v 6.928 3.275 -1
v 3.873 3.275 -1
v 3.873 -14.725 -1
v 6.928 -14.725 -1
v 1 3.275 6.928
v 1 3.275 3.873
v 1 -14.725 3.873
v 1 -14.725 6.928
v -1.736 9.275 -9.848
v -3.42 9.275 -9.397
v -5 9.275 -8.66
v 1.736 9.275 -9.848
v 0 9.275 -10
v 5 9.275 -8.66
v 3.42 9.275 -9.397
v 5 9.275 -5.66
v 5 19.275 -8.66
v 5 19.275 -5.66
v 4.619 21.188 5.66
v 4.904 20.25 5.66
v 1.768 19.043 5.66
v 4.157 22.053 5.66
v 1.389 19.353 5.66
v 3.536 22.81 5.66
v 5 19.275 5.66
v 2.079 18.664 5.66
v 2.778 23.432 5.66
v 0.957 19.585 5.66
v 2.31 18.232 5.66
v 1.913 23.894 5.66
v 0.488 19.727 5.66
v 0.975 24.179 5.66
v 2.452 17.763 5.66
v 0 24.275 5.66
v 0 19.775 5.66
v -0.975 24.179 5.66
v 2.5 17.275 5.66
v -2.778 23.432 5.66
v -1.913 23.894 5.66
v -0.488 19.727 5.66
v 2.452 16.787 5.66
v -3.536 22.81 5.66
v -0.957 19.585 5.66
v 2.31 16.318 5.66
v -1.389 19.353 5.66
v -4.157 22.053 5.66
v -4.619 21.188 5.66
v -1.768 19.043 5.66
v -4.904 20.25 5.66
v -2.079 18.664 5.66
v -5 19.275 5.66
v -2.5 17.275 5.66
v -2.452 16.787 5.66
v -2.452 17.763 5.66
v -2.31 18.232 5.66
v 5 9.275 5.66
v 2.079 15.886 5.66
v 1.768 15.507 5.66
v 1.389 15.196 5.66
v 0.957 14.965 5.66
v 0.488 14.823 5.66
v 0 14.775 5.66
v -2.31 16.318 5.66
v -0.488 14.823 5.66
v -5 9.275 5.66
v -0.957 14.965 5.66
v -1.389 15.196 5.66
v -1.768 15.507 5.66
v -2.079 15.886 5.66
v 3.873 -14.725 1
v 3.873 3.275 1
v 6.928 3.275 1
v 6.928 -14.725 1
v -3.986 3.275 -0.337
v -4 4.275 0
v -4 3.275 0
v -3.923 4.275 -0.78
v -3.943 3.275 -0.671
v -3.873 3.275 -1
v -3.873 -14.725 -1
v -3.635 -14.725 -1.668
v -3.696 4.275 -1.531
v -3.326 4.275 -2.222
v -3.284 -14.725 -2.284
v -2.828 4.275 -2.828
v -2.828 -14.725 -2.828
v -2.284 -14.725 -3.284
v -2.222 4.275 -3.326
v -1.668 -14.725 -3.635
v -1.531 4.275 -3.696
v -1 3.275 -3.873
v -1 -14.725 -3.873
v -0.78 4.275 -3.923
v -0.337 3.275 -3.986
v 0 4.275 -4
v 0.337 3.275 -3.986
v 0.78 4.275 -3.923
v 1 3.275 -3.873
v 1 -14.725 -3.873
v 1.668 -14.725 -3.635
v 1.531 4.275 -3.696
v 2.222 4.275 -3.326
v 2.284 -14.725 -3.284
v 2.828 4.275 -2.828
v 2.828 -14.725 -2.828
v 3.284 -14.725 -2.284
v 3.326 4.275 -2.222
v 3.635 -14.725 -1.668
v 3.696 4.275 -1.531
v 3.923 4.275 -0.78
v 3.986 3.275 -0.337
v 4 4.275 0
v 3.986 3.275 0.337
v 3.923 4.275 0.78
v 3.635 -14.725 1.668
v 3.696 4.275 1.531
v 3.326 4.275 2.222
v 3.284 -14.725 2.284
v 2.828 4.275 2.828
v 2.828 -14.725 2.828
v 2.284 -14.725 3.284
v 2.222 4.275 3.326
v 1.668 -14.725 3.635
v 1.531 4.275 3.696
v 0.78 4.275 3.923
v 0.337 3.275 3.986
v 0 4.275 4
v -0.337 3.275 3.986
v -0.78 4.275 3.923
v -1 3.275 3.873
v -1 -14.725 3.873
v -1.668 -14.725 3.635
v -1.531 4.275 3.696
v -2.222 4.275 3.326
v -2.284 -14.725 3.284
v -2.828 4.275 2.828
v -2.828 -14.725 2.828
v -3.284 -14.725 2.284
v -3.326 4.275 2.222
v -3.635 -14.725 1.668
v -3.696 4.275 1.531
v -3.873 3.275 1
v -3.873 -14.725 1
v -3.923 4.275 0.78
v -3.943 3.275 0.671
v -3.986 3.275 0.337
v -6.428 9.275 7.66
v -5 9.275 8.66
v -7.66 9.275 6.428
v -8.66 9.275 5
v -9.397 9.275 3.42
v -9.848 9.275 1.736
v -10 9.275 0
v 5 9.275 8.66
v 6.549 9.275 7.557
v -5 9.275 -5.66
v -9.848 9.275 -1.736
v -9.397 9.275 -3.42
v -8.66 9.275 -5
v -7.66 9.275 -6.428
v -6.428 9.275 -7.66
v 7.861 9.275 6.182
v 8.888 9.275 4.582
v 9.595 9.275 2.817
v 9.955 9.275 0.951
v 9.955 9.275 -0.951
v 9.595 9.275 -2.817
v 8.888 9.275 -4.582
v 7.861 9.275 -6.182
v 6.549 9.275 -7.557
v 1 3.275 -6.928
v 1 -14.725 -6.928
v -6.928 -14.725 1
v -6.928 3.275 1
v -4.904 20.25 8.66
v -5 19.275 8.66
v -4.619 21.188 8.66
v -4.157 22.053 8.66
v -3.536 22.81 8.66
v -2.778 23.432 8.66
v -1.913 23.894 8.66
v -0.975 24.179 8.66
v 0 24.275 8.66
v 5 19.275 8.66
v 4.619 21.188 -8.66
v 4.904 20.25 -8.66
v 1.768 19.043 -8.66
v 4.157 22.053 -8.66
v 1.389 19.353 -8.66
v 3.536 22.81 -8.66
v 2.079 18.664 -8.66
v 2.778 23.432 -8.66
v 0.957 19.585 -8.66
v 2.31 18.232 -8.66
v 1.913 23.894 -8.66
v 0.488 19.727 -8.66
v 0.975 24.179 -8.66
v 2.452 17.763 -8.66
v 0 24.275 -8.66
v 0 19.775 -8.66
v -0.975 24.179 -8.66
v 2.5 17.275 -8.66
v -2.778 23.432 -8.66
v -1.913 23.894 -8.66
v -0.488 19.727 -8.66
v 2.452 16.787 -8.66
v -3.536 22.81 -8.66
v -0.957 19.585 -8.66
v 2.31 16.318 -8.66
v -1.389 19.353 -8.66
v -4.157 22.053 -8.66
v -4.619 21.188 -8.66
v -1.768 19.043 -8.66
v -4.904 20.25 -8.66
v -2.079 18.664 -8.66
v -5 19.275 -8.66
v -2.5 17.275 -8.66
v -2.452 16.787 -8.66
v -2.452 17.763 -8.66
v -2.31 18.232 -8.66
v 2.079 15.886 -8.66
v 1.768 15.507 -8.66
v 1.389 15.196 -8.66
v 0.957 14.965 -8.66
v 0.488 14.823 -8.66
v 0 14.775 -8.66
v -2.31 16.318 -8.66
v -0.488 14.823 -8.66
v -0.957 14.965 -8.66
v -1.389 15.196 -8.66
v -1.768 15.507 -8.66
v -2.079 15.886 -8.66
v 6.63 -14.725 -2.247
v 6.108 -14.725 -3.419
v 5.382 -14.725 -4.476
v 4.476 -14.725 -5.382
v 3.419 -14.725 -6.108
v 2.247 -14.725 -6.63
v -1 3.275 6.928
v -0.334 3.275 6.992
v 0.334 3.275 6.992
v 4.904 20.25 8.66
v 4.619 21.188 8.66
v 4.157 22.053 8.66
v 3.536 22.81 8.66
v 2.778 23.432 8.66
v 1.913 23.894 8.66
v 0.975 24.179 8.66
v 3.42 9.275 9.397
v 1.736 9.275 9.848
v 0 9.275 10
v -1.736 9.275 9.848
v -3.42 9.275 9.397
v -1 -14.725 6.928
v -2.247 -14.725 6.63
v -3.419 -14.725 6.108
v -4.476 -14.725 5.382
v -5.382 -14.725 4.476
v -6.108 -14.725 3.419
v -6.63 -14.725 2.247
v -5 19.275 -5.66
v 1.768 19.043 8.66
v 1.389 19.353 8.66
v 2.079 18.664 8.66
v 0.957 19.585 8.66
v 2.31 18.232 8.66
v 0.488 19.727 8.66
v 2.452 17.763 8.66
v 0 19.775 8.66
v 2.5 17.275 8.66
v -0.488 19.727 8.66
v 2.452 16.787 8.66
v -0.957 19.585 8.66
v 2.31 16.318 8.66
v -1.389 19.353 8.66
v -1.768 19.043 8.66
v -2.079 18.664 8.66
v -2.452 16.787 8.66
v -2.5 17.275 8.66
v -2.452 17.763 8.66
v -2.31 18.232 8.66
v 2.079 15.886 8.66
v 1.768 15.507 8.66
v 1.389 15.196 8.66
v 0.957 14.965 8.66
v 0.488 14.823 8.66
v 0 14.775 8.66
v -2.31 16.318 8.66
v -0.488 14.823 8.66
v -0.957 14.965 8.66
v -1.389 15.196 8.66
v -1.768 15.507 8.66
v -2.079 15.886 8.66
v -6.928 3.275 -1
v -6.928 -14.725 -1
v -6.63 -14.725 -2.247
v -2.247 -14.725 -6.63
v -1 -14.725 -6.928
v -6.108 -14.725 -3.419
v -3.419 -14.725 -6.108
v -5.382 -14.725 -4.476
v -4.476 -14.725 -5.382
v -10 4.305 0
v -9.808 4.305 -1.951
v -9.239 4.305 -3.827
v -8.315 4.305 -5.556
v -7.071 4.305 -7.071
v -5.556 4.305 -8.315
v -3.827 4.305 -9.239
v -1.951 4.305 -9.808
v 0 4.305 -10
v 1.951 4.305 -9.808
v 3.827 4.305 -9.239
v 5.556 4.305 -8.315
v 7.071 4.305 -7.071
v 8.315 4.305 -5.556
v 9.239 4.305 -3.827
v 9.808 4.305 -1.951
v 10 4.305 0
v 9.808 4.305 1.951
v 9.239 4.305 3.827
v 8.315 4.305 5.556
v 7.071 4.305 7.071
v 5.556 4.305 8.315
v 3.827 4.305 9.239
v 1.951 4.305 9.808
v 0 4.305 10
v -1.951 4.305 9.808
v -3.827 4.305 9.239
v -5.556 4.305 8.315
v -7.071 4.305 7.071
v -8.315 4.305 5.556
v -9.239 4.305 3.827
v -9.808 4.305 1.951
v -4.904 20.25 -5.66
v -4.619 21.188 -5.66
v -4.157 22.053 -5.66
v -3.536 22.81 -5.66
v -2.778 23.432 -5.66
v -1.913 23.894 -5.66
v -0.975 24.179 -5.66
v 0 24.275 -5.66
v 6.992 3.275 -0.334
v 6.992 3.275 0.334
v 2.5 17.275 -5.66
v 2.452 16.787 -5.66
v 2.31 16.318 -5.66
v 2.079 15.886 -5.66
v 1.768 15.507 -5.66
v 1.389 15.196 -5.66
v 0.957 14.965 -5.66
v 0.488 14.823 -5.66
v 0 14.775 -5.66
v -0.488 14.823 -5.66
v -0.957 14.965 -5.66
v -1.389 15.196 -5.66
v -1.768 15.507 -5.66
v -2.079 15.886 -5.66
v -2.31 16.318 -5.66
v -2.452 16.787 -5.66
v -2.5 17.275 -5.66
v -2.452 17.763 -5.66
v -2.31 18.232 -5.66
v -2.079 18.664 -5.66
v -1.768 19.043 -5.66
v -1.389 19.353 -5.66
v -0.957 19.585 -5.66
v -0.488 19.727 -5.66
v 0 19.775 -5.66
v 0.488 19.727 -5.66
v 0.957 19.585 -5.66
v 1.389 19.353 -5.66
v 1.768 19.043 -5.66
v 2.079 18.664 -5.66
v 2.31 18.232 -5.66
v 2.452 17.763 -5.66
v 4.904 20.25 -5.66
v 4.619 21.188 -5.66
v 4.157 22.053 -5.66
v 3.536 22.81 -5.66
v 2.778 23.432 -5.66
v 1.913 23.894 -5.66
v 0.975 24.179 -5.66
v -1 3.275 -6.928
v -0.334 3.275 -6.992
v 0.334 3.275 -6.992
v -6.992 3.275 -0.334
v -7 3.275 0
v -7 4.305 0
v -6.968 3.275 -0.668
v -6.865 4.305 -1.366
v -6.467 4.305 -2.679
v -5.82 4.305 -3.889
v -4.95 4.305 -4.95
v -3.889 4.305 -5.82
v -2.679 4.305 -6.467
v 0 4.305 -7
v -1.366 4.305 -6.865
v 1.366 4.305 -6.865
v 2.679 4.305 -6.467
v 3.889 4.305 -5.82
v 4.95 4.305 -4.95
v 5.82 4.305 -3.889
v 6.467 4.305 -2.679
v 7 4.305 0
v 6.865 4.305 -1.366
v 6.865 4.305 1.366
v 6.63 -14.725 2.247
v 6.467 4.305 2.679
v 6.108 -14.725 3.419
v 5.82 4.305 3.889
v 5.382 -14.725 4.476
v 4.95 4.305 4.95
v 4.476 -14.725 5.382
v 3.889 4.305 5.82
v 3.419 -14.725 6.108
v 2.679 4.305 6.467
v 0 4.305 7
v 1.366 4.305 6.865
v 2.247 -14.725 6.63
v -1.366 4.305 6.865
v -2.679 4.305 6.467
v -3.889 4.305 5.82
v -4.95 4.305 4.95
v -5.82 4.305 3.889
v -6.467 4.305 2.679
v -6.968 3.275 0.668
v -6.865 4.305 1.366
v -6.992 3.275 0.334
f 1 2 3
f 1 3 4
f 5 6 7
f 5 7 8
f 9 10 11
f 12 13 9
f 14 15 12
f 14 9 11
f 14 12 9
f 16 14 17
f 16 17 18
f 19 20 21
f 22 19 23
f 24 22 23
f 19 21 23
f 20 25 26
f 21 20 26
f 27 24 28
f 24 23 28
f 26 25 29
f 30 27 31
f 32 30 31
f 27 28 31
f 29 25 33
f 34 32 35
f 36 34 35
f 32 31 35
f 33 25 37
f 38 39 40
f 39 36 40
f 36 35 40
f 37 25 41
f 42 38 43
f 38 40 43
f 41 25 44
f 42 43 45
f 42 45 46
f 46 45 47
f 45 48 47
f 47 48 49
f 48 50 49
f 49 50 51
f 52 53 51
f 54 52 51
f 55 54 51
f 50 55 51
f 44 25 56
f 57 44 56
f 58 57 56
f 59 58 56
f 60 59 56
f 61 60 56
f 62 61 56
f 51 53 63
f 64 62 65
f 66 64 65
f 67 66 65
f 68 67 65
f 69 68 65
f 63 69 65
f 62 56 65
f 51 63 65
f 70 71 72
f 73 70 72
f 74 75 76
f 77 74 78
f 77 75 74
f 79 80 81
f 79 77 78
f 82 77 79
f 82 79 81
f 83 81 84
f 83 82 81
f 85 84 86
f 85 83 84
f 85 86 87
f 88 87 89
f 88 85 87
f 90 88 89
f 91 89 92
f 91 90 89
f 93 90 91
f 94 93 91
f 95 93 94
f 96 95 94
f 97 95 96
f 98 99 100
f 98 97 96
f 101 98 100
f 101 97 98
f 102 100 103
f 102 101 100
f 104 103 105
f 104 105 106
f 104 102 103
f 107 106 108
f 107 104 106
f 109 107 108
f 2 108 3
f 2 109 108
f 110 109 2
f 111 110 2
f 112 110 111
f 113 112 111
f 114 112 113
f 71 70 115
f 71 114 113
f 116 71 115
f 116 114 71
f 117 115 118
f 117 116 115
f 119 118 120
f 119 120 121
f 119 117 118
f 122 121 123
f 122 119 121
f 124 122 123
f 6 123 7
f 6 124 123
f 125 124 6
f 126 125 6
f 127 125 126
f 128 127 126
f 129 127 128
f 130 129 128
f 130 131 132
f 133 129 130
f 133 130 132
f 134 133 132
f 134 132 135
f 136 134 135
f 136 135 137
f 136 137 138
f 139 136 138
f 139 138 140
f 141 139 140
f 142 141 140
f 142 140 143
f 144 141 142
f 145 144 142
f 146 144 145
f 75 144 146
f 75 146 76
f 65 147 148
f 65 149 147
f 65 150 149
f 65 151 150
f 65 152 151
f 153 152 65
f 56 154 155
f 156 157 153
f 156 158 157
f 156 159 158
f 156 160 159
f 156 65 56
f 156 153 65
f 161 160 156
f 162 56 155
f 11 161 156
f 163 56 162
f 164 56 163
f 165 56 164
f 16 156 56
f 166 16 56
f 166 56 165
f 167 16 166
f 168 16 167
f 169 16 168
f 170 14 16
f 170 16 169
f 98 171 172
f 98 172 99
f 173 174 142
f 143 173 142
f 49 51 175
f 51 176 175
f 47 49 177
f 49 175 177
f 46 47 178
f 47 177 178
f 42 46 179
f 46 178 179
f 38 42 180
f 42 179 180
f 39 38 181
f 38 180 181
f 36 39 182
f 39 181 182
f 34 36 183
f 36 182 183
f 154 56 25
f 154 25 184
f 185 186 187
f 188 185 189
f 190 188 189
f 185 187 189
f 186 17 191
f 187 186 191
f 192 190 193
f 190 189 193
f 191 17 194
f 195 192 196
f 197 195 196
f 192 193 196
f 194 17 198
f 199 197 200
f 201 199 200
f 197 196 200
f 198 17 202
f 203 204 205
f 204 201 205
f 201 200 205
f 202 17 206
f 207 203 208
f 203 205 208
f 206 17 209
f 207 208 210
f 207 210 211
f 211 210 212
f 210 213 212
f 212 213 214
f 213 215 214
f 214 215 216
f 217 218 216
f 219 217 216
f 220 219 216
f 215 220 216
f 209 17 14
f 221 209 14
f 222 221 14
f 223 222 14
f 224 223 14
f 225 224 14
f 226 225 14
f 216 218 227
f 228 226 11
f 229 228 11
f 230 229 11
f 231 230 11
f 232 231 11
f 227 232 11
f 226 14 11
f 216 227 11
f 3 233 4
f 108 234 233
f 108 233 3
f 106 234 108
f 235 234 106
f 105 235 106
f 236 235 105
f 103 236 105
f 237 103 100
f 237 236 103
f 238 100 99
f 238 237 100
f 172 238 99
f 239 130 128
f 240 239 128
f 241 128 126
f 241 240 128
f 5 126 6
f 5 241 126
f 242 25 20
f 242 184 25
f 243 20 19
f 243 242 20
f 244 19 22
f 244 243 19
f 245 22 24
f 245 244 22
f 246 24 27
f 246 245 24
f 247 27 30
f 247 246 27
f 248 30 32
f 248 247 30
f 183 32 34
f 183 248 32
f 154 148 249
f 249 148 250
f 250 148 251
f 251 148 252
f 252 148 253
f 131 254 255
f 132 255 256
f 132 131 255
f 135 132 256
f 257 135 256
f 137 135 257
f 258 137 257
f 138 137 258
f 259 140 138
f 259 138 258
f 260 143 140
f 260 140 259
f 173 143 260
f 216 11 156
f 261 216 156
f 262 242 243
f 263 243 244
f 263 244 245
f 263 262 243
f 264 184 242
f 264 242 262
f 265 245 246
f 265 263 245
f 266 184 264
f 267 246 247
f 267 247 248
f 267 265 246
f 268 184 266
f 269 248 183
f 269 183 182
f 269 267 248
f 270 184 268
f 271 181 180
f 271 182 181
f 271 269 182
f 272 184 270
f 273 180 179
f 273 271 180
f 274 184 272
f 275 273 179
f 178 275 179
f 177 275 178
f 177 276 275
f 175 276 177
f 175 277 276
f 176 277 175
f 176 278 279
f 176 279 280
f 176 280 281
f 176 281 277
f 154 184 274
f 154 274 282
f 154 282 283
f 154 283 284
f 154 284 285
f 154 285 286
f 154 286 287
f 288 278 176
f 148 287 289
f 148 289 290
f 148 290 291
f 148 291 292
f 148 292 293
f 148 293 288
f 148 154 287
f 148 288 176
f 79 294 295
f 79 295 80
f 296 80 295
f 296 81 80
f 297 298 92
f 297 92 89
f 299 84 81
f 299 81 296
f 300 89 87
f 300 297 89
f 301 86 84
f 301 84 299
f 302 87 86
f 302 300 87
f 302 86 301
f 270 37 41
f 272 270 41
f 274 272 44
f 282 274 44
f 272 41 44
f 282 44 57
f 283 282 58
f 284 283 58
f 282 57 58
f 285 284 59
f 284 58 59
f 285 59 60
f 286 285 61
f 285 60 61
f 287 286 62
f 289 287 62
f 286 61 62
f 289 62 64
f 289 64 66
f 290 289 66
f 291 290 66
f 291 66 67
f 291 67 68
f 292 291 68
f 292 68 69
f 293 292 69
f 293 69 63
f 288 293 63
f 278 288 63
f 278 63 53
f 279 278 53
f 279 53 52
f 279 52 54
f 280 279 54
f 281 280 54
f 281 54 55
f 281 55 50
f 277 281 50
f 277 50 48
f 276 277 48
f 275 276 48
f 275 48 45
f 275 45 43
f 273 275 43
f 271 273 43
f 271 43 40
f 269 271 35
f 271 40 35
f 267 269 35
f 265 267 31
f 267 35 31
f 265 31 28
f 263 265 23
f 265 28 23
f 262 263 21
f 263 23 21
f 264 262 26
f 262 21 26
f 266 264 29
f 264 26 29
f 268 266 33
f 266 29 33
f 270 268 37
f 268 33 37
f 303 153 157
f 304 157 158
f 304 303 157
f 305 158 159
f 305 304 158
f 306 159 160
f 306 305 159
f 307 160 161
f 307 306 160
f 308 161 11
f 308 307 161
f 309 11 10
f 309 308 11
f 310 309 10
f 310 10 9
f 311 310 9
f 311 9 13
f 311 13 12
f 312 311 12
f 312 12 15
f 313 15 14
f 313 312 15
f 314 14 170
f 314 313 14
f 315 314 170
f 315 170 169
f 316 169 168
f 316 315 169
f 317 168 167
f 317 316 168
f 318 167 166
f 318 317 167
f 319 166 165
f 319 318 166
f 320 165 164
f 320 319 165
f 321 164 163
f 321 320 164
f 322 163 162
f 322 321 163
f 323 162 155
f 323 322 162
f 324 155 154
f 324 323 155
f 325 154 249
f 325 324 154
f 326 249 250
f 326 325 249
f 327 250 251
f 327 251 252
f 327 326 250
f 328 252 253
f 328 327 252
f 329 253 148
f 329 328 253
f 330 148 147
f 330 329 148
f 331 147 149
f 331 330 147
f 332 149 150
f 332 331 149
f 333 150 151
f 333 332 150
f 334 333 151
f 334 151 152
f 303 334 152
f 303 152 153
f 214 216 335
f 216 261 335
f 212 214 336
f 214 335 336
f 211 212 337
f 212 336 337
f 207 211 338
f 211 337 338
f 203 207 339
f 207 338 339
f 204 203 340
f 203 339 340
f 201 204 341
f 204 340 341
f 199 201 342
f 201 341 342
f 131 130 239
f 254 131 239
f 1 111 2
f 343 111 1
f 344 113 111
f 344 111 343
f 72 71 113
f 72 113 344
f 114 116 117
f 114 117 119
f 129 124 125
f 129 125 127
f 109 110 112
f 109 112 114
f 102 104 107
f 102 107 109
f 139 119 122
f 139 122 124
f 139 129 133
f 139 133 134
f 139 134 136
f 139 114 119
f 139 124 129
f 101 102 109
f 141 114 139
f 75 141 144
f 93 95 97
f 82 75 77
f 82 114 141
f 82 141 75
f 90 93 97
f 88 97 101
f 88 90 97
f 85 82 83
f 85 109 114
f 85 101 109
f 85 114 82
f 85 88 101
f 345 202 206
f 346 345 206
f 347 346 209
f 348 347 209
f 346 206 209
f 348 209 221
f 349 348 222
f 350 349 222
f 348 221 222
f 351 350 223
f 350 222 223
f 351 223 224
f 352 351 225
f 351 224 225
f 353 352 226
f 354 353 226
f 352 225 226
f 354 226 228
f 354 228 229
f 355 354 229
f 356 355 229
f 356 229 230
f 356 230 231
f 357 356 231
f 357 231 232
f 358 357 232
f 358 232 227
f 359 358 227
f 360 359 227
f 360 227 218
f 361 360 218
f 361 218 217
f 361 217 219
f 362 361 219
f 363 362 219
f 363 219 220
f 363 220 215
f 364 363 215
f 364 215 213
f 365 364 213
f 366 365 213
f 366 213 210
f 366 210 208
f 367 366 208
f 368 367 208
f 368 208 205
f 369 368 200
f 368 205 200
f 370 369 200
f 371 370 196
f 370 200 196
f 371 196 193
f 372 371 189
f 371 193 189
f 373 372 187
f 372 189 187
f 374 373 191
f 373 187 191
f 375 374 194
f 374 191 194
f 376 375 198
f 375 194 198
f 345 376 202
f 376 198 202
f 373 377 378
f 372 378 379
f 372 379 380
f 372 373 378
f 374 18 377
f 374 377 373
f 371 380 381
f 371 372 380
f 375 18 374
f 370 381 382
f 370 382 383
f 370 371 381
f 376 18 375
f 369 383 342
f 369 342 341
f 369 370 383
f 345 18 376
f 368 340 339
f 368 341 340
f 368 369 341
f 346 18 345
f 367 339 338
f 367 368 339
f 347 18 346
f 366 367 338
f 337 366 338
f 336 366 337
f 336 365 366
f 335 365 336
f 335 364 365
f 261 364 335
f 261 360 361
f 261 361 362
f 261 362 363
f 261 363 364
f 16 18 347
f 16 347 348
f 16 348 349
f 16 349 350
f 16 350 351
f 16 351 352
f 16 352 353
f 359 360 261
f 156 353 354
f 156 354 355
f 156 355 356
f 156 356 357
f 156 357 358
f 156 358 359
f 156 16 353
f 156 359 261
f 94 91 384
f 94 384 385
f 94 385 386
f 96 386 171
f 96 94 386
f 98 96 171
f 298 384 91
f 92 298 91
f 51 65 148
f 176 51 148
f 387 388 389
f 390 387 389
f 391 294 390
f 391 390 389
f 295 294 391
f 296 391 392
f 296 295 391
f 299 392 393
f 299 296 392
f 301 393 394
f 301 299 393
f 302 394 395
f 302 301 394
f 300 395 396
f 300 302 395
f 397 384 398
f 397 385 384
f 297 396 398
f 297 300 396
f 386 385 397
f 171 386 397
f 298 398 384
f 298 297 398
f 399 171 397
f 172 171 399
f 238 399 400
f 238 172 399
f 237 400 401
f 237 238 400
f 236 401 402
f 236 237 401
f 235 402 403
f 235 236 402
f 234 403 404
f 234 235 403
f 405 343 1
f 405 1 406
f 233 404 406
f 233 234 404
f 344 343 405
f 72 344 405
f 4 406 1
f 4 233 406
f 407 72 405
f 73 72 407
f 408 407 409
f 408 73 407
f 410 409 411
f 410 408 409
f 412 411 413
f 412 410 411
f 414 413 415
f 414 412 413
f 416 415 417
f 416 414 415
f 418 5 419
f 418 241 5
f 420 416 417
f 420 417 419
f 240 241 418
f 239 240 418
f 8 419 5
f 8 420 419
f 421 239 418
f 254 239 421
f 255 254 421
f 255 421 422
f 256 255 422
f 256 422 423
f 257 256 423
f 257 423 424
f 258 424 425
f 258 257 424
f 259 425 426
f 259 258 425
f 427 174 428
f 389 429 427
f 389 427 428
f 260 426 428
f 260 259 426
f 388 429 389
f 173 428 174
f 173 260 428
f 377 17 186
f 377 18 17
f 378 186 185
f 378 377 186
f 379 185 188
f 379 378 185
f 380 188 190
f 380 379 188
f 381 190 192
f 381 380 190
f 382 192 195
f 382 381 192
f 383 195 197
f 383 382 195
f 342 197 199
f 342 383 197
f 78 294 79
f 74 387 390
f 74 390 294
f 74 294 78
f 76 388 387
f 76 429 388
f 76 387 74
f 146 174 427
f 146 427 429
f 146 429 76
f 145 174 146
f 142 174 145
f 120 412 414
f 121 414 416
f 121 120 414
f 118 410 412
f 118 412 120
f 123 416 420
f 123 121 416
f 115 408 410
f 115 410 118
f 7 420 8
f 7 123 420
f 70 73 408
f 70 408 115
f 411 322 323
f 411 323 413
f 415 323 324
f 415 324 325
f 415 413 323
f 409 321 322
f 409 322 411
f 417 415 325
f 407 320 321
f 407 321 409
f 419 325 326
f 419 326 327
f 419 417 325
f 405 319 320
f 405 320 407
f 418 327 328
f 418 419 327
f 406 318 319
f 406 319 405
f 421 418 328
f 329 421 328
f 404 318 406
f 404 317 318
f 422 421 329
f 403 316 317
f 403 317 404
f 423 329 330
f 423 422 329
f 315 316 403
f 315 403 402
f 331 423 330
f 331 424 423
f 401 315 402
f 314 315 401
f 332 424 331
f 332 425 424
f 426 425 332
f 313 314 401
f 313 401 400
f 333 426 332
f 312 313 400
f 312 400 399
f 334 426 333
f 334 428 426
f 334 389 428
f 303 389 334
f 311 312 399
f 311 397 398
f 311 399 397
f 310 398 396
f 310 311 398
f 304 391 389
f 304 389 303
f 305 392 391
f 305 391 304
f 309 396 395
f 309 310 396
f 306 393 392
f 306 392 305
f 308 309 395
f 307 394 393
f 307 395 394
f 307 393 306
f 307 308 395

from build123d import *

# Parameters (mm, degrees)
F2_W     = 10
F2_H     = 3
F3_DEPTH = 15
F4_R     = 4.99999
F5_R     = 2.5
F6_DEPTH = 18.6612540378
F7_W     = 2
F7_H     = 4.8000003753
F7_W_2   = 4.8000003753
F7_H_2   = 2
F8_DEPTH = 18


# Not quite as in the source:
# - a fillet or chamfer is up to 0.001 mm smaller than in the source, because OpenCascade refuses the exact size


with BuildPart() as f1:
    # F0 (on Top) → F1 (revolve)
    with BuildSketch(Plane.XY):
        Polygon((0, 9.2748147342), (-10, 9.2748147342), (-10, 4.304778154), (-7, 4.304778154), (-7, -14.7251852658), (-4, -14.7251852658), (-4, 4.2748147342), (0, 4.2748147342), align=None)
    revolve(axis=Axis((0, 6.7748147342, 0), (0, -1, 0)))

    # F2 (on face) → F3 (join)
    with BuildSketch(Plane(origin=(0, 9.2748147342, 0), x_dir=(-1, 0, 0), z_dir=(0, 1, 0))):
        with Locations((0, 7.1602540378)):
            Rectangle(F2_W, F2_H)
        with Locations((0, -7.1602540378)):
            Rectangle(F2_W, F2_H)
    extrude(amount=F3_DEPTH)

    # F4 (radius 5 in the source; OpenCascade refuses exactly that, so slightly less here)
    f4_edges = [f1.edges().sort_by_distance(p)[0] for p in [
        (-5, 24.274815, -7.160254),
        (5, 24.274815, -7.160254),
        (5, 24.274815, 7.160254),
        (-5, 24.274815, 7.160254),
    ]]
    fillet(f4_edges, radius=F4_R)

    # F5 (on face) → F6 (cut, through all)
    with BuildSketch(Plane(origin=(0, 0, -8.6602540378), x_dir=(1, 0, 0), z_dir=(0, 0, -1))):
        with Locations((0, -17.2748147342)):
            Circle(F5_R)
    extrude(amount=-F6_DEPTH, mode=Mode.SUBTRACT)

    # F7 (on face) → F8 (cut)
    with BuildSketch(Plane.XZ.offset(14.7251852658)):
        with Locations((0, 5.4849120788)):
            Rectangle(F7_W, F7_H)
        with Locations((-5.4849120788, 0)):
            Rectangle(F7_W_2, F7_H_2)
        with Locations((0, -5.4849120788)):
            Rectangle(F7_W, F7_H)
        with Locations((5.4849120788, 0)):
            Rectangle(F7_W_2, F7_H_2)
    extrude(amount=-F8_DEPTH, mode=Mode.SUBTRACT)


solid = f1.part
